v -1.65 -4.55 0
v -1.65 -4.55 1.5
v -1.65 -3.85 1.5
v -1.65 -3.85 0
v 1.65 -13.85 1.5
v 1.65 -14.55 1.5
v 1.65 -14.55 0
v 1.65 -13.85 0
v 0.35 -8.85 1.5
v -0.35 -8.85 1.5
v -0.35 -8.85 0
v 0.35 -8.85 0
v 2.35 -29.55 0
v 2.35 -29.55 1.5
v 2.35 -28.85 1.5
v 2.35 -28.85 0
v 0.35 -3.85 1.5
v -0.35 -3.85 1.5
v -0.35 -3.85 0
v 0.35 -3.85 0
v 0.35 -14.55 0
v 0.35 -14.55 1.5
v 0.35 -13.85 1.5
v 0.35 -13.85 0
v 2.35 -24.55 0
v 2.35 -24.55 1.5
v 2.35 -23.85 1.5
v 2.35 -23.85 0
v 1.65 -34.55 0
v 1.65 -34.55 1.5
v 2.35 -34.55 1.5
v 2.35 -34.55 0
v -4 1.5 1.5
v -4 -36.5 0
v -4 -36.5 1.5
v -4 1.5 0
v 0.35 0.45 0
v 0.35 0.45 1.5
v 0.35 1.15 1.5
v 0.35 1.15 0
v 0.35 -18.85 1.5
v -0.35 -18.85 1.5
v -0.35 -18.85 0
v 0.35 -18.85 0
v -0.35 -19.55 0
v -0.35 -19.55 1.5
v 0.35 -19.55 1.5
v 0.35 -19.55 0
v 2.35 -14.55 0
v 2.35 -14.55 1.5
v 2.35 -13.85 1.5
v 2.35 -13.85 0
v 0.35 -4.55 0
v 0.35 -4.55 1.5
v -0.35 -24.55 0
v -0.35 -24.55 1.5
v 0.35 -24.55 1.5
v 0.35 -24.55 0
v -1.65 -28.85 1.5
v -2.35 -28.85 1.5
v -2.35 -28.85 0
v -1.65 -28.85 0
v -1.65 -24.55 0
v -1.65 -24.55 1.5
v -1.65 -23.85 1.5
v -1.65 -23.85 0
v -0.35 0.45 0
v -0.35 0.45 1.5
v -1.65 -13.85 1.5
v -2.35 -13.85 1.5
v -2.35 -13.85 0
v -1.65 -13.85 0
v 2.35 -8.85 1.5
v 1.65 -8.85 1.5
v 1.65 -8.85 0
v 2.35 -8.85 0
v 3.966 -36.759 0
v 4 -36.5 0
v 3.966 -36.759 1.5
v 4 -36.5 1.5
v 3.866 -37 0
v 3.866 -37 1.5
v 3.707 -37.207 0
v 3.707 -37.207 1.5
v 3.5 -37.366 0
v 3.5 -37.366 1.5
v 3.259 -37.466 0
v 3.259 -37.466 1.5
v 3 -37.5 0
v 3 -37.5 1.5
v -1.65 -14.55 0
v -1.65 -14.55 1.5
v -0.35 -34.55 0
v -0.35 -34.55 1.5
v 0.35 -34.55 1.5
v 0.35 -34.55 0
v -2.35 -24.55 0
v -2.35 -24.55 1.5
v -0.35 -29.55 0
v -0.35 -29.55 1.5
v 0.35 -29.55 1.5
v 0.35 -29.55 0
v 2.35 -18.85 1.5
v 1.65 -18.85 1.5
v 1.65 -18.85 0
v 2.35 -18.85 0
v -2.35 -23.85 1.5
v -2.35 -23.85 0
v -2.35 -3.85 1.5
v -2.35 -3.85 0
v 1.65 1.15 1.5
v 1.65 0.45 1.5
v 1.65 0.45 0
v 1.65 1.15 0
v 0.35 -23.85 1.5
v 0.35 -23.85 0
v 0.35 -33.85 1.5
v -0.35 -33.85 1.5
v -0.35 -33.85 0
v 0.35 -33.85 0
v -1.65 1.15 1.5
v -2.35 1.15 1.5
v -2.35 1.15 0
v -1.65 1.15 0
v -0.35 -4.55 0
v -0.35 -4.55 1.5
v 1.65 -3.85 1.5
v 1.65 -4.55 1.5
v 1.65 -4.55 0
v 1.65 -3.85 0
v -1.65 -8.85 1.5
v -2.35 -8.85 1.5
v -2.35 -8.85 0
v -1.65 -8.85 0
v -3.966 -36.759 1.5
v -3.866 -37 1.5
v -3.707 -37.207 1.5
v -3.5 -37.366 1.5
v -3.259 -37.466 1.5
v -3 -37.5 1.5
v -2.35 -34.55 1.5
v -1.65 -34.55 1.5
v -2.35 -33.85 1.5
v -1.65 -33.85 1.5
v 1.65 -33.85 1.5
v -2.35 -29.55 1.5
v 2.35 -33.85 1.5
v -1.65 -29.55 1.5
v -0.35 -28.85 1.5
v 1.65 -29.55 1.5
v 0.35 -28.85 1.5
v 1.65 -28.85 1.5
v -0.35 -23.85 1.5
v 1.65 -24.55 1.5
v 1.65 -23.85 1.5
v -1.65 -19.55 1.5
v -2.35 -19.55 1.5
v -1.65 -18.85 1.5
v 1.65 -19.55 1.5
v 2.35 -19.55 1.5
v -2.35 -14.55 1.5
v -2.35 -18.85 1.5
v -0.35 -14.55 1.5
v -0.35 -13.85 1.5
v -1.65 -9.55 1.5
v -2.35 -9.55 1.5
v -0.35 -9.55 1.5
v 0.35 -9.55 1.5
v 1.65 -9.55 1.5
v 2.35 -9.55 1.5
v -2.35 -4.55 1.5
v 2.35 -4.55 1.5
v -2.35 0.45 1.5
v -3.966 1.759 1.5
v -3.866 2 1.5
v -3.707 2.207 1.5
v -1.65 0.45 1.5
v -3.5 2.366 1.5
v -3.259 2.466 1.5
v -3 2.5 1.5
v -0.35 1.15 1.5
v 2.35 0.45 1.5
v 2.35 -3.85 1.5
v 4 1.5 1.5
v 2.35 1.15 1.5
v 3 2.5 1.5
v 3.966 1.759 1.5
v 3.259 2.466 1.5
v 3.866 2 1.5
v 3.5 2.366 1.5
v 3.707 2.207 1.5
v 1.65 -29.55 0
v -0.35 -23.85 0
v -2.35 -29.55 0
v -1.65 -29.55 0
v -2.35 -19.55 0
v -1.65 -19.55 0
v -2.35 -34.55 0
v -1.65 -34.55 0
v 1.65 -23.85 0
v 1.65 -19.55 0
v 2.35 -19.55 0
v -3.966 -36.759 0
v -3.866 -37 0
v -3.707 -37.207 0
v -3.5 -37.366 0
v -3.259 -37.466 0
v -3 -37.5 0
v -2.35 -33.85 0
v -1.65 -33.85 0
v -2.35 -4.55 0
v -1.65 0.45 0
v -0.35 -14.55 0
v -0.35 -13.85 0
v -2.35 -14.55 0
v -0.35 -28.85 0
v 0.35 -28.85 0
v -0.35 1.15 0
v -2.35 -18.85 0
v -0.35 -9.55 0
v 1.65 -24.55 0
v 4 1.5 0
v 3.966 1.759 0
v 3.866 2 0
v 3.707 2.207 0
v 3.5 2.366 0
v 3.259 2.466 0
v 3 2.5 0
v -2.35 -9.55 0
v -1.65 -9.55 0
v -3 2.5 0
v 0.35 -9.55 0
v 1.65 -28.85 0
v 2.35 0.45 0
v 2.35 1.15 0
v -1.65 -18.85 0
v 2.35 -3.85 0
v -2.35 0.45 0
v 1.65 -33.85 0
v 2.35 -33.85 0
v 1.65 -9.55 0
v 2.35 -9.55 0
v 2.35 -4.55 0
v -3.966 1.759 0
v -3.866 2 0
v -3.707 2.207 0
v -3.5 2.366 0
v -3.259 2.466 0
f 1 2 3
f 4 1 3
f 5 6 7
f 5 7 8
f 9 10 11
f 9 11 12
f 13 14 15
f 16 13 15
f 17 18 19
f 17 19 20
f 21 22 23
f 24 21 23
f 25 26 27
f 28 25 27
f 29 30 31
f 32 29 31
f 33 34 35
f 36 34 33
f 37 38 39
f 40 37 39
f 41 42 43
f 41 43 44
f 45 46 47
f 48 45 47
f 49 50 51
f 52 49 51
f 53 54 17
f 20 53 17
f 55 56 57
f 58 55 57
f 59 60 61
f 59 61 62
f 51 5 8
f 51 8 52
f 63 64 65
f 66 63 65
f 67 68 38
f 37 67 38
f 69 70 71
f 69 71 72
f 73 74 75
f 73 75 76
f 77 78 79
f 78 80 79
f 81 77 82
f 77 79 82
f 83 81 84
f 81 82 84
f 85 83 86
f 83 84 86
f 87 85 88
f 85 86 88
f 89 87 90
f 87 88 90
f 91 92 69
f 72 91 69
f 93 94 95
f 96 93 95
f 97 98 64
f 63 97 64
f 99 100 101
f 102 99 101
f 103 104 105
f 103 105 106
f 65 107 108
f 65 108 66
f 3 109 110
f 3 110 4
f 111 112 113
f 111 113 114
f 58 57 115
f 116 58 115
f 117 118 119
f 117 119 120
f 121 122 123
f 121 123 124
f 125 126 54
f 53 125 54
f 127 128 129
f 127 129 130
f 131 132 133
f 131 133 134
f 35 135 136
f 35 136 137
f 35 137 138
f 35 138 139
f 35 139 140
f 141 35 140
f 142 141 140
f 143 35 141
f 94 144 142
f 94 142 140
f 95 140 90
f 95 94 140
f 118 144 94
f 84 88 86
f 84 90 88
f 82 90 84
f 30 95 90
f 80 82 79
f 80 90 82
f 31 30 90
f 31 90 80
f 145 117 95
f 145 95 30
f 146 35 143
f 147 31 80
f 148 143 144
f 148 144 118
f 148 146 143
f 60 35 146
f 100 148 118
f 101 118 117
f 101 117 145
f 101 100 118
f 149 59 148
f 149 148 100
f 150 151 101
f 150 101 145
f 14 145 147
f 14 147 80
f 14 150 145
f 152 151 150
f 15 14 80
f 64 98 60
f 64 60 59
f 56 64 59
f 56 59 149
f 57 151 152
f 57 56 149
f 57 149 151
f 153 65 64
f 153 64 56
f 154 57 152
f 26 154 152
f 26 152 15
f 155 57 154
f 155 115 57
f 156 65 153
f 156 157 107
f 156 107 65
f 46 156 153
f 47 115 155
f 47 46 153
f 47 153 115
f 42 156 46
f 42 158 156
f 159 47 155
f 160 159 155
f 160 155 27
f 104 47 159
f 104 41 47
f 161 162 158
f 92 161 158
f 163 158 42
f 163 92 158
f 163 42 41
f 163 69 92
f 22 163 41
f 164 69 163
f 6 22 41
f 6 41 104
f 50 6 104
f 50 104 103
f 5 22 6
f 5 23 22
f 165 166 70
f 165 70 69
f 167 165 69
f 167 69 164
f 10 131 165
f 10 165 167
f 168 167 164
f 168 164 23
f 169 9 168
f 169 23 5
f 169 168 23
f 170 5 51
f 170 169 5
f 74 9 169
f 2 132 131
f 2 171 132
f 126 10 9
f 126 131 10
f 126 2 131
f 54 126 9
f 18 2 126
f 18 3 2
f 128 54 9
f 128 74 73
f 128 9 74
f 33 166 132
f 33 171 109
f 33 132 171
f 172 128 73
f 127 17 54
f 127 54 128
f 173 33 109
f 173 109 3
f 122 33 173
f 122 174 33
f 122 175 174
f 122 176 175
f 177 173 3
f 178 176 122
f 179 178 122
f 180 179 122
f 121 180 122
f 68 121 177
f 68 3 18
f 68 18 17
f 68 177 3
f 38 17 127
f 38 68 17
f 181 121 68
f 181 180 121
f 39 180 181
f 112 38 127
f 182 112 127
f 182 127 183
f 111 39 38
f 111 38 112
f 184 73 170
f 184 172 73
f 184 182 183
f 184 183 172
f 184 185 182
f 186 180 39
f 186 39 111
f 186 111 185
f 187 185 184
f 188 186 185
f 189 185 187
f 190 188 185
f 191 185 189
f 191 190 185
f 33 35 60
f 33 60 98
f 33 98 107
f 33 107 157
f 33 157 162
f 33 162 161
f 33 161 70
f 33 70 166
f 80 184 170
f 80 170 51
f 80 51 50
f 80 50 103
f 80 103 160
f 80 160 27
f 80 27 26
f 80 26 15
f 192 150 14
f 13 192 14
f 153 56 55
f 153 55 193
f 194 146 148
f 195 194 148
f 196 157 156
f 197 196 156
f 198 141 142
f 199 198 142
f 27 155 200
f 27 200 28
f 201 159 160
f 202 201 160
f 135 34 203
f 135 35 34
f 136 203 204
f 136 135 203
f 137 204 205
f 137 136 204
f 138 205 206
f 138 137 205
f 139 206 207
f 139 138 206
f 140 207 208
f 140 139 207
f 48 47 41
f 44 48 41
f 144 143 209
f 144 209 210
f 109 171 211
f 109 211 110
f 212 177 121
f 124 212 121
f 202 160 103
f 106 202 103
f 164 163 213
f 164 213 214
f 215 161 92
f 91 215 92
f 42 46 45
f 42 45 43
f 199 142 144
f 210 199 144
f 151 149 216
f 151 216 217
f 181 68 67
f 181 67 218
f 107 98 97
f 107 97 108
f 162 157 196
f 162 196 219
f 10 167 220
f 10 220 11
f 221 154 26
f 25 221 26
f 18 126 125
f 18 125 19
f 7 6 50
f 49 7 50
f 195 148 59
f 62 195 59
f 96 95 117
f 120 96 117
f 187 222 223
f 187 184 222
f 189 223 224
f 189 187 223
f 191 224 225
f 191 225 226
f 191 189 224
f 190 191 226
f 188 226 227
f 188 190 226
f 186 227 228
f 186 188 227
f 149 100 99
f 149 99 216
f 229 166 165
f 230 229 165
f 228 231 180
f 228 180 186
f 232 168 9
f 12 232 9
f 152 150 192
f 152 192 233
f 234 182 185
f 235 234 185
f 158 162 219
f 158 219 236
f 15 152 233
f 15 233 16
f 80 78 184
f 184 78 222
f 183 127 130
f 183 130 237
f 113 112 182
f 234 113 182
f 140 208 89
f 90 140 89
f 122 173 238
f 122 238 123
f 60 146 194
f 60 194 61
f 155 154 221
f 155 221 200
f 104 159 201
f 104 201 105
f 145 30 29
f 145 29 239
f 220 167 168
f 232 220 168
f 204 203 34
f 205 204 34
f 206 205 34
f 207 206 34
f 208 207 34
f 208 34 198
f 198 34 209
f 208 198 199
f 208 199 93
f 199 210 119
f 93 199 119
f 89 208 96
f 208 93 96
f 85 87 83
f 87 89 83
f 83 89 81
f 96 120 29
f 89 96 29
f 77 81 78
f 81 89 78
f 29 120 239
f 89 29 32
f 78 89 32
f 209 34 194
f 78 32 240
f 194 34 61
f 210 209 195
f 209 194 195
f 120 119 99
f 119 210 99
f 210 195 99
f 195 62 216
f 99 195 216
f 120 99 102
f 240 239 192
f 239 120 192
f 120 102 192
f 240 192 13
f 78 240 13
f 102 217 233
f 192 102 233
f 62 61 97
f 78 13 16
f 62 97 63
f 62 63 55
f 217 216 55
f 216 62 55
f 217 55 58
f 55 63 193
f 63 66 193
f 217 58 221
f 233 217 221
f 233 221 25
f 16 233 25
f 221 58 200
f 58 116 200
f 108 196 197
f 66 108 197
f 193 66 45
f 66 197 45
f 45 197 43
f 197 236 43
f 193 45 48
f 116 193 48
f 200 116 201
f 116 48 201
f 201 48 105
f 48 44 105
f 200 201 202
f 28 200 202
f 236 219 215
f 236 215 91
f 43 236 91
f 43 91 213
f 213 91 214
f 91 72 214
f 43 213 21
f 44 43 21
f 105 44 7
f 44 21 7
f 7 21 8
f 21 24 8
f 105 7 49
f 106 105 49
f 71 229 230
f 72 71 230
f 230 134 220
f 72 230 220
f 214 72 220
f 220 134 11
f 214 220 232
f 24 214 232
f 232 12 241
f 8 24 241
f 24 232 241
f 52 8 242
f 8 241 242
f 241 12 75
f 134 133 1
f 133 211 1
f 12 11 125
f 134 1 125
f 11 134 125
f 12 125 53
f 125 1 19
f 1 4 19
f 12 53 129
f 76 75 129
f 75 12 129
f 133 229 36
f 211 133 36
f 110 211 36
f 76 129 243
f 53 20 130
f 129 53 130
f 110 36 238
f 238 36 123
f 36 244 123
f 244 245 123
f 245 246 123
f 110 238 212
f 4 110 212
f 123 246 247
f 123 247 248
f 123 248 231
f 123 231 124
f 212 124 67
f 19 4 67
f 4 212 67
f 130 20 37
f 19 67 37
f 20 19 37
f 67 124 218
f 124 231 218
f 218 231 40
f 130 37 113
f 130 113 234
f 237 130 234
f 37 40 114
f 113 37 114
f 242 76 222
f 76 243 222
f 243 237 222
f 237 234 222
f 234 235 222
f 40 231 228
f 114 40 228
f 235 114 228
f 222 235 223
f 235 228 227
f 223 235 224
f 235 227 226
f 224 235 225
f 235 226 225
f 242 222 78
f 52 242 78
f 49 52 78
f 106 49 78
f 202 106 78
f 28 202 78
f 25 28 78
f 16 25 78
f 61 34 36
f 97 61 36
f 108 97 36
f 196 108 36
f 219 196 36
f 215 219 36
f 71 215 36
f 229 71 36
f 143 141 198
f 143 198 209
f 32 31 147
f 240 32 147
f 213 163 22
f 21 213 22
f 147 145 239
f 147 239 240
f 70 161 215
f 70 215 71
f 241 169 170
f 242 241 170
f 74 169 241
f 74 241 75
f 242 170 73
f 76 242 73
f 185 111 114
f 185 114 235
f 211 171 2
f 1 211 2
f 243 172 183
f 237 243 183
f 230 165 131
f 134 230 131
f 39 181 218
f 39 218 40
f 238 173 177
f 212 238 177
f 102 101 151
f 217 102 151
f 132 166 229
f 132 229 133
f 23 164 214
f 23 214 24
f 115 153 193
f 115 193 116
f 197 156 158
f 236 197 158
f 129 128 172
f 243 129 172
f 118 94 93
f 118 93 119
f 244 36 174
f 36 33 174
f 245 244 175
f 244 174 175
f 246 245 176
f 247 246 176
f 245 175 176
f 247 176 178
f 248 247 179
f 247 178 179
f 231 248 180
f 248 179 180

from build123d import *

# Parameters (mm, degrees)
SKETCH1_W           = 8
SKETCH1_H           = 5
BOSS_EXTRUDE1_DEPTH = 1.5
SKETCH2_W           = 0.7
SKETCH2_H           = 0.7
CUT_EXTRUDE1_DEPTH  = 2.5
LPATTERN1_COUNT     = 8
LPATTERN1_PITCH     = 5
FILLET1_R           = 1


with BuildPart() as part:
    # Sketch1 → Boss-Extrude1 (new body)
    with BuildSketch(Plane.XY):
        Rectangle(SKETCH1_W, SKETCH1_H)
    extrude(amount=BOSS_EXTRUDE1_DEPTH)

    # Sketch2 → Cut-Extrude1 (cut, through all)
    with BuildSketch(Plane.XY.offset(1.5)):
        with Locations((-2, 0.8)):
            Rectangle(SKETCH2_W, SKETCH2_H)
        with Locations((0, 0.8)):
            Rectangle(SKETCH2_W, SKETCH2_H)
        with Locations((2, 0.8)):
            Rectangle(SKETCH2_W, SKETCH2_H)
    extrude(amount=-CUT_EXTRUDE1_DEPTH, mode=Mode.SUBTRACT)


with BuildPart() as lpattern1_1:
    # LPattern1: pattern copy
    add(part.part.moved(Location(Vector(0, -1, 0) * (1 * LPATTERN1_PITCH))))


with BuildPart() as lpattern1_2:
    # LPattern1: pattern copy
    add(part.part.moved(Location(Vector(0, -1, 0) * (2 * LPATTERN1_PITCH))))


with BuildPart() as lpattern1_3:
    # LPattern1: pattern copy
    add(part.part.moved(Location(Vector(0, -1, 0) * (3 * LPATTERN1_PITCH))))


with BuildPart() as lpattern1_4:
    # LPattern1: pattern copy
    add(part.part.moved(Location(Vector(0, -1, 0) * (4 * LPATTERN1_PITCH))))


with BuildPart() as lpattern1_5:
    # LPattern1: pattern copy
    add(part.part.moved(Location(Vector(0, -1, 0) * (5 * LPATTERN1_PITCH))))


with BuildPart() as lpattern1_6:
    # LPattern1: pattern copy
    add(part.part.moved(Location(Vector(0, -1, 0) * (6 * LPATTERN1_PITCH))))


with BuildPart() as lpattern1_7:
    # LPattern1: pattern copy
    add(part.part.moved(Location(Vector(0, -1, 0) * (7 * LPATTERN1_PITCH))))


with BuildPart() as part_1:
    add(part.part)

    # Combine1: union LPattern1_1, LPattern1_2, LPattern1_3, LPattern1_4, LPattern1_5, LPattern1_6, LPattern1_7
    add(lpattern1_1.part)
    add(lpattern1_2.part)
    add(lpattern1_3.part)
    add(lpattern1_4.part)
    add(lpattern1_5.part)
    add(lpattern1_6.part)
    add(lpattern1_7.part)

    # Fillet1
    fillet1_edges = [part_1.edges().sort_by_distance(p)[0] for p in [
        (4, -37.5, 0.75),
        (-4, 2.5, 0.75),
        (4, 2.5, 0.75),
        (-4, -37.5, 0.75),
    ]]
    fillet(fillet1_edges, radius=FILLET1_R)


solid = part_1.part
